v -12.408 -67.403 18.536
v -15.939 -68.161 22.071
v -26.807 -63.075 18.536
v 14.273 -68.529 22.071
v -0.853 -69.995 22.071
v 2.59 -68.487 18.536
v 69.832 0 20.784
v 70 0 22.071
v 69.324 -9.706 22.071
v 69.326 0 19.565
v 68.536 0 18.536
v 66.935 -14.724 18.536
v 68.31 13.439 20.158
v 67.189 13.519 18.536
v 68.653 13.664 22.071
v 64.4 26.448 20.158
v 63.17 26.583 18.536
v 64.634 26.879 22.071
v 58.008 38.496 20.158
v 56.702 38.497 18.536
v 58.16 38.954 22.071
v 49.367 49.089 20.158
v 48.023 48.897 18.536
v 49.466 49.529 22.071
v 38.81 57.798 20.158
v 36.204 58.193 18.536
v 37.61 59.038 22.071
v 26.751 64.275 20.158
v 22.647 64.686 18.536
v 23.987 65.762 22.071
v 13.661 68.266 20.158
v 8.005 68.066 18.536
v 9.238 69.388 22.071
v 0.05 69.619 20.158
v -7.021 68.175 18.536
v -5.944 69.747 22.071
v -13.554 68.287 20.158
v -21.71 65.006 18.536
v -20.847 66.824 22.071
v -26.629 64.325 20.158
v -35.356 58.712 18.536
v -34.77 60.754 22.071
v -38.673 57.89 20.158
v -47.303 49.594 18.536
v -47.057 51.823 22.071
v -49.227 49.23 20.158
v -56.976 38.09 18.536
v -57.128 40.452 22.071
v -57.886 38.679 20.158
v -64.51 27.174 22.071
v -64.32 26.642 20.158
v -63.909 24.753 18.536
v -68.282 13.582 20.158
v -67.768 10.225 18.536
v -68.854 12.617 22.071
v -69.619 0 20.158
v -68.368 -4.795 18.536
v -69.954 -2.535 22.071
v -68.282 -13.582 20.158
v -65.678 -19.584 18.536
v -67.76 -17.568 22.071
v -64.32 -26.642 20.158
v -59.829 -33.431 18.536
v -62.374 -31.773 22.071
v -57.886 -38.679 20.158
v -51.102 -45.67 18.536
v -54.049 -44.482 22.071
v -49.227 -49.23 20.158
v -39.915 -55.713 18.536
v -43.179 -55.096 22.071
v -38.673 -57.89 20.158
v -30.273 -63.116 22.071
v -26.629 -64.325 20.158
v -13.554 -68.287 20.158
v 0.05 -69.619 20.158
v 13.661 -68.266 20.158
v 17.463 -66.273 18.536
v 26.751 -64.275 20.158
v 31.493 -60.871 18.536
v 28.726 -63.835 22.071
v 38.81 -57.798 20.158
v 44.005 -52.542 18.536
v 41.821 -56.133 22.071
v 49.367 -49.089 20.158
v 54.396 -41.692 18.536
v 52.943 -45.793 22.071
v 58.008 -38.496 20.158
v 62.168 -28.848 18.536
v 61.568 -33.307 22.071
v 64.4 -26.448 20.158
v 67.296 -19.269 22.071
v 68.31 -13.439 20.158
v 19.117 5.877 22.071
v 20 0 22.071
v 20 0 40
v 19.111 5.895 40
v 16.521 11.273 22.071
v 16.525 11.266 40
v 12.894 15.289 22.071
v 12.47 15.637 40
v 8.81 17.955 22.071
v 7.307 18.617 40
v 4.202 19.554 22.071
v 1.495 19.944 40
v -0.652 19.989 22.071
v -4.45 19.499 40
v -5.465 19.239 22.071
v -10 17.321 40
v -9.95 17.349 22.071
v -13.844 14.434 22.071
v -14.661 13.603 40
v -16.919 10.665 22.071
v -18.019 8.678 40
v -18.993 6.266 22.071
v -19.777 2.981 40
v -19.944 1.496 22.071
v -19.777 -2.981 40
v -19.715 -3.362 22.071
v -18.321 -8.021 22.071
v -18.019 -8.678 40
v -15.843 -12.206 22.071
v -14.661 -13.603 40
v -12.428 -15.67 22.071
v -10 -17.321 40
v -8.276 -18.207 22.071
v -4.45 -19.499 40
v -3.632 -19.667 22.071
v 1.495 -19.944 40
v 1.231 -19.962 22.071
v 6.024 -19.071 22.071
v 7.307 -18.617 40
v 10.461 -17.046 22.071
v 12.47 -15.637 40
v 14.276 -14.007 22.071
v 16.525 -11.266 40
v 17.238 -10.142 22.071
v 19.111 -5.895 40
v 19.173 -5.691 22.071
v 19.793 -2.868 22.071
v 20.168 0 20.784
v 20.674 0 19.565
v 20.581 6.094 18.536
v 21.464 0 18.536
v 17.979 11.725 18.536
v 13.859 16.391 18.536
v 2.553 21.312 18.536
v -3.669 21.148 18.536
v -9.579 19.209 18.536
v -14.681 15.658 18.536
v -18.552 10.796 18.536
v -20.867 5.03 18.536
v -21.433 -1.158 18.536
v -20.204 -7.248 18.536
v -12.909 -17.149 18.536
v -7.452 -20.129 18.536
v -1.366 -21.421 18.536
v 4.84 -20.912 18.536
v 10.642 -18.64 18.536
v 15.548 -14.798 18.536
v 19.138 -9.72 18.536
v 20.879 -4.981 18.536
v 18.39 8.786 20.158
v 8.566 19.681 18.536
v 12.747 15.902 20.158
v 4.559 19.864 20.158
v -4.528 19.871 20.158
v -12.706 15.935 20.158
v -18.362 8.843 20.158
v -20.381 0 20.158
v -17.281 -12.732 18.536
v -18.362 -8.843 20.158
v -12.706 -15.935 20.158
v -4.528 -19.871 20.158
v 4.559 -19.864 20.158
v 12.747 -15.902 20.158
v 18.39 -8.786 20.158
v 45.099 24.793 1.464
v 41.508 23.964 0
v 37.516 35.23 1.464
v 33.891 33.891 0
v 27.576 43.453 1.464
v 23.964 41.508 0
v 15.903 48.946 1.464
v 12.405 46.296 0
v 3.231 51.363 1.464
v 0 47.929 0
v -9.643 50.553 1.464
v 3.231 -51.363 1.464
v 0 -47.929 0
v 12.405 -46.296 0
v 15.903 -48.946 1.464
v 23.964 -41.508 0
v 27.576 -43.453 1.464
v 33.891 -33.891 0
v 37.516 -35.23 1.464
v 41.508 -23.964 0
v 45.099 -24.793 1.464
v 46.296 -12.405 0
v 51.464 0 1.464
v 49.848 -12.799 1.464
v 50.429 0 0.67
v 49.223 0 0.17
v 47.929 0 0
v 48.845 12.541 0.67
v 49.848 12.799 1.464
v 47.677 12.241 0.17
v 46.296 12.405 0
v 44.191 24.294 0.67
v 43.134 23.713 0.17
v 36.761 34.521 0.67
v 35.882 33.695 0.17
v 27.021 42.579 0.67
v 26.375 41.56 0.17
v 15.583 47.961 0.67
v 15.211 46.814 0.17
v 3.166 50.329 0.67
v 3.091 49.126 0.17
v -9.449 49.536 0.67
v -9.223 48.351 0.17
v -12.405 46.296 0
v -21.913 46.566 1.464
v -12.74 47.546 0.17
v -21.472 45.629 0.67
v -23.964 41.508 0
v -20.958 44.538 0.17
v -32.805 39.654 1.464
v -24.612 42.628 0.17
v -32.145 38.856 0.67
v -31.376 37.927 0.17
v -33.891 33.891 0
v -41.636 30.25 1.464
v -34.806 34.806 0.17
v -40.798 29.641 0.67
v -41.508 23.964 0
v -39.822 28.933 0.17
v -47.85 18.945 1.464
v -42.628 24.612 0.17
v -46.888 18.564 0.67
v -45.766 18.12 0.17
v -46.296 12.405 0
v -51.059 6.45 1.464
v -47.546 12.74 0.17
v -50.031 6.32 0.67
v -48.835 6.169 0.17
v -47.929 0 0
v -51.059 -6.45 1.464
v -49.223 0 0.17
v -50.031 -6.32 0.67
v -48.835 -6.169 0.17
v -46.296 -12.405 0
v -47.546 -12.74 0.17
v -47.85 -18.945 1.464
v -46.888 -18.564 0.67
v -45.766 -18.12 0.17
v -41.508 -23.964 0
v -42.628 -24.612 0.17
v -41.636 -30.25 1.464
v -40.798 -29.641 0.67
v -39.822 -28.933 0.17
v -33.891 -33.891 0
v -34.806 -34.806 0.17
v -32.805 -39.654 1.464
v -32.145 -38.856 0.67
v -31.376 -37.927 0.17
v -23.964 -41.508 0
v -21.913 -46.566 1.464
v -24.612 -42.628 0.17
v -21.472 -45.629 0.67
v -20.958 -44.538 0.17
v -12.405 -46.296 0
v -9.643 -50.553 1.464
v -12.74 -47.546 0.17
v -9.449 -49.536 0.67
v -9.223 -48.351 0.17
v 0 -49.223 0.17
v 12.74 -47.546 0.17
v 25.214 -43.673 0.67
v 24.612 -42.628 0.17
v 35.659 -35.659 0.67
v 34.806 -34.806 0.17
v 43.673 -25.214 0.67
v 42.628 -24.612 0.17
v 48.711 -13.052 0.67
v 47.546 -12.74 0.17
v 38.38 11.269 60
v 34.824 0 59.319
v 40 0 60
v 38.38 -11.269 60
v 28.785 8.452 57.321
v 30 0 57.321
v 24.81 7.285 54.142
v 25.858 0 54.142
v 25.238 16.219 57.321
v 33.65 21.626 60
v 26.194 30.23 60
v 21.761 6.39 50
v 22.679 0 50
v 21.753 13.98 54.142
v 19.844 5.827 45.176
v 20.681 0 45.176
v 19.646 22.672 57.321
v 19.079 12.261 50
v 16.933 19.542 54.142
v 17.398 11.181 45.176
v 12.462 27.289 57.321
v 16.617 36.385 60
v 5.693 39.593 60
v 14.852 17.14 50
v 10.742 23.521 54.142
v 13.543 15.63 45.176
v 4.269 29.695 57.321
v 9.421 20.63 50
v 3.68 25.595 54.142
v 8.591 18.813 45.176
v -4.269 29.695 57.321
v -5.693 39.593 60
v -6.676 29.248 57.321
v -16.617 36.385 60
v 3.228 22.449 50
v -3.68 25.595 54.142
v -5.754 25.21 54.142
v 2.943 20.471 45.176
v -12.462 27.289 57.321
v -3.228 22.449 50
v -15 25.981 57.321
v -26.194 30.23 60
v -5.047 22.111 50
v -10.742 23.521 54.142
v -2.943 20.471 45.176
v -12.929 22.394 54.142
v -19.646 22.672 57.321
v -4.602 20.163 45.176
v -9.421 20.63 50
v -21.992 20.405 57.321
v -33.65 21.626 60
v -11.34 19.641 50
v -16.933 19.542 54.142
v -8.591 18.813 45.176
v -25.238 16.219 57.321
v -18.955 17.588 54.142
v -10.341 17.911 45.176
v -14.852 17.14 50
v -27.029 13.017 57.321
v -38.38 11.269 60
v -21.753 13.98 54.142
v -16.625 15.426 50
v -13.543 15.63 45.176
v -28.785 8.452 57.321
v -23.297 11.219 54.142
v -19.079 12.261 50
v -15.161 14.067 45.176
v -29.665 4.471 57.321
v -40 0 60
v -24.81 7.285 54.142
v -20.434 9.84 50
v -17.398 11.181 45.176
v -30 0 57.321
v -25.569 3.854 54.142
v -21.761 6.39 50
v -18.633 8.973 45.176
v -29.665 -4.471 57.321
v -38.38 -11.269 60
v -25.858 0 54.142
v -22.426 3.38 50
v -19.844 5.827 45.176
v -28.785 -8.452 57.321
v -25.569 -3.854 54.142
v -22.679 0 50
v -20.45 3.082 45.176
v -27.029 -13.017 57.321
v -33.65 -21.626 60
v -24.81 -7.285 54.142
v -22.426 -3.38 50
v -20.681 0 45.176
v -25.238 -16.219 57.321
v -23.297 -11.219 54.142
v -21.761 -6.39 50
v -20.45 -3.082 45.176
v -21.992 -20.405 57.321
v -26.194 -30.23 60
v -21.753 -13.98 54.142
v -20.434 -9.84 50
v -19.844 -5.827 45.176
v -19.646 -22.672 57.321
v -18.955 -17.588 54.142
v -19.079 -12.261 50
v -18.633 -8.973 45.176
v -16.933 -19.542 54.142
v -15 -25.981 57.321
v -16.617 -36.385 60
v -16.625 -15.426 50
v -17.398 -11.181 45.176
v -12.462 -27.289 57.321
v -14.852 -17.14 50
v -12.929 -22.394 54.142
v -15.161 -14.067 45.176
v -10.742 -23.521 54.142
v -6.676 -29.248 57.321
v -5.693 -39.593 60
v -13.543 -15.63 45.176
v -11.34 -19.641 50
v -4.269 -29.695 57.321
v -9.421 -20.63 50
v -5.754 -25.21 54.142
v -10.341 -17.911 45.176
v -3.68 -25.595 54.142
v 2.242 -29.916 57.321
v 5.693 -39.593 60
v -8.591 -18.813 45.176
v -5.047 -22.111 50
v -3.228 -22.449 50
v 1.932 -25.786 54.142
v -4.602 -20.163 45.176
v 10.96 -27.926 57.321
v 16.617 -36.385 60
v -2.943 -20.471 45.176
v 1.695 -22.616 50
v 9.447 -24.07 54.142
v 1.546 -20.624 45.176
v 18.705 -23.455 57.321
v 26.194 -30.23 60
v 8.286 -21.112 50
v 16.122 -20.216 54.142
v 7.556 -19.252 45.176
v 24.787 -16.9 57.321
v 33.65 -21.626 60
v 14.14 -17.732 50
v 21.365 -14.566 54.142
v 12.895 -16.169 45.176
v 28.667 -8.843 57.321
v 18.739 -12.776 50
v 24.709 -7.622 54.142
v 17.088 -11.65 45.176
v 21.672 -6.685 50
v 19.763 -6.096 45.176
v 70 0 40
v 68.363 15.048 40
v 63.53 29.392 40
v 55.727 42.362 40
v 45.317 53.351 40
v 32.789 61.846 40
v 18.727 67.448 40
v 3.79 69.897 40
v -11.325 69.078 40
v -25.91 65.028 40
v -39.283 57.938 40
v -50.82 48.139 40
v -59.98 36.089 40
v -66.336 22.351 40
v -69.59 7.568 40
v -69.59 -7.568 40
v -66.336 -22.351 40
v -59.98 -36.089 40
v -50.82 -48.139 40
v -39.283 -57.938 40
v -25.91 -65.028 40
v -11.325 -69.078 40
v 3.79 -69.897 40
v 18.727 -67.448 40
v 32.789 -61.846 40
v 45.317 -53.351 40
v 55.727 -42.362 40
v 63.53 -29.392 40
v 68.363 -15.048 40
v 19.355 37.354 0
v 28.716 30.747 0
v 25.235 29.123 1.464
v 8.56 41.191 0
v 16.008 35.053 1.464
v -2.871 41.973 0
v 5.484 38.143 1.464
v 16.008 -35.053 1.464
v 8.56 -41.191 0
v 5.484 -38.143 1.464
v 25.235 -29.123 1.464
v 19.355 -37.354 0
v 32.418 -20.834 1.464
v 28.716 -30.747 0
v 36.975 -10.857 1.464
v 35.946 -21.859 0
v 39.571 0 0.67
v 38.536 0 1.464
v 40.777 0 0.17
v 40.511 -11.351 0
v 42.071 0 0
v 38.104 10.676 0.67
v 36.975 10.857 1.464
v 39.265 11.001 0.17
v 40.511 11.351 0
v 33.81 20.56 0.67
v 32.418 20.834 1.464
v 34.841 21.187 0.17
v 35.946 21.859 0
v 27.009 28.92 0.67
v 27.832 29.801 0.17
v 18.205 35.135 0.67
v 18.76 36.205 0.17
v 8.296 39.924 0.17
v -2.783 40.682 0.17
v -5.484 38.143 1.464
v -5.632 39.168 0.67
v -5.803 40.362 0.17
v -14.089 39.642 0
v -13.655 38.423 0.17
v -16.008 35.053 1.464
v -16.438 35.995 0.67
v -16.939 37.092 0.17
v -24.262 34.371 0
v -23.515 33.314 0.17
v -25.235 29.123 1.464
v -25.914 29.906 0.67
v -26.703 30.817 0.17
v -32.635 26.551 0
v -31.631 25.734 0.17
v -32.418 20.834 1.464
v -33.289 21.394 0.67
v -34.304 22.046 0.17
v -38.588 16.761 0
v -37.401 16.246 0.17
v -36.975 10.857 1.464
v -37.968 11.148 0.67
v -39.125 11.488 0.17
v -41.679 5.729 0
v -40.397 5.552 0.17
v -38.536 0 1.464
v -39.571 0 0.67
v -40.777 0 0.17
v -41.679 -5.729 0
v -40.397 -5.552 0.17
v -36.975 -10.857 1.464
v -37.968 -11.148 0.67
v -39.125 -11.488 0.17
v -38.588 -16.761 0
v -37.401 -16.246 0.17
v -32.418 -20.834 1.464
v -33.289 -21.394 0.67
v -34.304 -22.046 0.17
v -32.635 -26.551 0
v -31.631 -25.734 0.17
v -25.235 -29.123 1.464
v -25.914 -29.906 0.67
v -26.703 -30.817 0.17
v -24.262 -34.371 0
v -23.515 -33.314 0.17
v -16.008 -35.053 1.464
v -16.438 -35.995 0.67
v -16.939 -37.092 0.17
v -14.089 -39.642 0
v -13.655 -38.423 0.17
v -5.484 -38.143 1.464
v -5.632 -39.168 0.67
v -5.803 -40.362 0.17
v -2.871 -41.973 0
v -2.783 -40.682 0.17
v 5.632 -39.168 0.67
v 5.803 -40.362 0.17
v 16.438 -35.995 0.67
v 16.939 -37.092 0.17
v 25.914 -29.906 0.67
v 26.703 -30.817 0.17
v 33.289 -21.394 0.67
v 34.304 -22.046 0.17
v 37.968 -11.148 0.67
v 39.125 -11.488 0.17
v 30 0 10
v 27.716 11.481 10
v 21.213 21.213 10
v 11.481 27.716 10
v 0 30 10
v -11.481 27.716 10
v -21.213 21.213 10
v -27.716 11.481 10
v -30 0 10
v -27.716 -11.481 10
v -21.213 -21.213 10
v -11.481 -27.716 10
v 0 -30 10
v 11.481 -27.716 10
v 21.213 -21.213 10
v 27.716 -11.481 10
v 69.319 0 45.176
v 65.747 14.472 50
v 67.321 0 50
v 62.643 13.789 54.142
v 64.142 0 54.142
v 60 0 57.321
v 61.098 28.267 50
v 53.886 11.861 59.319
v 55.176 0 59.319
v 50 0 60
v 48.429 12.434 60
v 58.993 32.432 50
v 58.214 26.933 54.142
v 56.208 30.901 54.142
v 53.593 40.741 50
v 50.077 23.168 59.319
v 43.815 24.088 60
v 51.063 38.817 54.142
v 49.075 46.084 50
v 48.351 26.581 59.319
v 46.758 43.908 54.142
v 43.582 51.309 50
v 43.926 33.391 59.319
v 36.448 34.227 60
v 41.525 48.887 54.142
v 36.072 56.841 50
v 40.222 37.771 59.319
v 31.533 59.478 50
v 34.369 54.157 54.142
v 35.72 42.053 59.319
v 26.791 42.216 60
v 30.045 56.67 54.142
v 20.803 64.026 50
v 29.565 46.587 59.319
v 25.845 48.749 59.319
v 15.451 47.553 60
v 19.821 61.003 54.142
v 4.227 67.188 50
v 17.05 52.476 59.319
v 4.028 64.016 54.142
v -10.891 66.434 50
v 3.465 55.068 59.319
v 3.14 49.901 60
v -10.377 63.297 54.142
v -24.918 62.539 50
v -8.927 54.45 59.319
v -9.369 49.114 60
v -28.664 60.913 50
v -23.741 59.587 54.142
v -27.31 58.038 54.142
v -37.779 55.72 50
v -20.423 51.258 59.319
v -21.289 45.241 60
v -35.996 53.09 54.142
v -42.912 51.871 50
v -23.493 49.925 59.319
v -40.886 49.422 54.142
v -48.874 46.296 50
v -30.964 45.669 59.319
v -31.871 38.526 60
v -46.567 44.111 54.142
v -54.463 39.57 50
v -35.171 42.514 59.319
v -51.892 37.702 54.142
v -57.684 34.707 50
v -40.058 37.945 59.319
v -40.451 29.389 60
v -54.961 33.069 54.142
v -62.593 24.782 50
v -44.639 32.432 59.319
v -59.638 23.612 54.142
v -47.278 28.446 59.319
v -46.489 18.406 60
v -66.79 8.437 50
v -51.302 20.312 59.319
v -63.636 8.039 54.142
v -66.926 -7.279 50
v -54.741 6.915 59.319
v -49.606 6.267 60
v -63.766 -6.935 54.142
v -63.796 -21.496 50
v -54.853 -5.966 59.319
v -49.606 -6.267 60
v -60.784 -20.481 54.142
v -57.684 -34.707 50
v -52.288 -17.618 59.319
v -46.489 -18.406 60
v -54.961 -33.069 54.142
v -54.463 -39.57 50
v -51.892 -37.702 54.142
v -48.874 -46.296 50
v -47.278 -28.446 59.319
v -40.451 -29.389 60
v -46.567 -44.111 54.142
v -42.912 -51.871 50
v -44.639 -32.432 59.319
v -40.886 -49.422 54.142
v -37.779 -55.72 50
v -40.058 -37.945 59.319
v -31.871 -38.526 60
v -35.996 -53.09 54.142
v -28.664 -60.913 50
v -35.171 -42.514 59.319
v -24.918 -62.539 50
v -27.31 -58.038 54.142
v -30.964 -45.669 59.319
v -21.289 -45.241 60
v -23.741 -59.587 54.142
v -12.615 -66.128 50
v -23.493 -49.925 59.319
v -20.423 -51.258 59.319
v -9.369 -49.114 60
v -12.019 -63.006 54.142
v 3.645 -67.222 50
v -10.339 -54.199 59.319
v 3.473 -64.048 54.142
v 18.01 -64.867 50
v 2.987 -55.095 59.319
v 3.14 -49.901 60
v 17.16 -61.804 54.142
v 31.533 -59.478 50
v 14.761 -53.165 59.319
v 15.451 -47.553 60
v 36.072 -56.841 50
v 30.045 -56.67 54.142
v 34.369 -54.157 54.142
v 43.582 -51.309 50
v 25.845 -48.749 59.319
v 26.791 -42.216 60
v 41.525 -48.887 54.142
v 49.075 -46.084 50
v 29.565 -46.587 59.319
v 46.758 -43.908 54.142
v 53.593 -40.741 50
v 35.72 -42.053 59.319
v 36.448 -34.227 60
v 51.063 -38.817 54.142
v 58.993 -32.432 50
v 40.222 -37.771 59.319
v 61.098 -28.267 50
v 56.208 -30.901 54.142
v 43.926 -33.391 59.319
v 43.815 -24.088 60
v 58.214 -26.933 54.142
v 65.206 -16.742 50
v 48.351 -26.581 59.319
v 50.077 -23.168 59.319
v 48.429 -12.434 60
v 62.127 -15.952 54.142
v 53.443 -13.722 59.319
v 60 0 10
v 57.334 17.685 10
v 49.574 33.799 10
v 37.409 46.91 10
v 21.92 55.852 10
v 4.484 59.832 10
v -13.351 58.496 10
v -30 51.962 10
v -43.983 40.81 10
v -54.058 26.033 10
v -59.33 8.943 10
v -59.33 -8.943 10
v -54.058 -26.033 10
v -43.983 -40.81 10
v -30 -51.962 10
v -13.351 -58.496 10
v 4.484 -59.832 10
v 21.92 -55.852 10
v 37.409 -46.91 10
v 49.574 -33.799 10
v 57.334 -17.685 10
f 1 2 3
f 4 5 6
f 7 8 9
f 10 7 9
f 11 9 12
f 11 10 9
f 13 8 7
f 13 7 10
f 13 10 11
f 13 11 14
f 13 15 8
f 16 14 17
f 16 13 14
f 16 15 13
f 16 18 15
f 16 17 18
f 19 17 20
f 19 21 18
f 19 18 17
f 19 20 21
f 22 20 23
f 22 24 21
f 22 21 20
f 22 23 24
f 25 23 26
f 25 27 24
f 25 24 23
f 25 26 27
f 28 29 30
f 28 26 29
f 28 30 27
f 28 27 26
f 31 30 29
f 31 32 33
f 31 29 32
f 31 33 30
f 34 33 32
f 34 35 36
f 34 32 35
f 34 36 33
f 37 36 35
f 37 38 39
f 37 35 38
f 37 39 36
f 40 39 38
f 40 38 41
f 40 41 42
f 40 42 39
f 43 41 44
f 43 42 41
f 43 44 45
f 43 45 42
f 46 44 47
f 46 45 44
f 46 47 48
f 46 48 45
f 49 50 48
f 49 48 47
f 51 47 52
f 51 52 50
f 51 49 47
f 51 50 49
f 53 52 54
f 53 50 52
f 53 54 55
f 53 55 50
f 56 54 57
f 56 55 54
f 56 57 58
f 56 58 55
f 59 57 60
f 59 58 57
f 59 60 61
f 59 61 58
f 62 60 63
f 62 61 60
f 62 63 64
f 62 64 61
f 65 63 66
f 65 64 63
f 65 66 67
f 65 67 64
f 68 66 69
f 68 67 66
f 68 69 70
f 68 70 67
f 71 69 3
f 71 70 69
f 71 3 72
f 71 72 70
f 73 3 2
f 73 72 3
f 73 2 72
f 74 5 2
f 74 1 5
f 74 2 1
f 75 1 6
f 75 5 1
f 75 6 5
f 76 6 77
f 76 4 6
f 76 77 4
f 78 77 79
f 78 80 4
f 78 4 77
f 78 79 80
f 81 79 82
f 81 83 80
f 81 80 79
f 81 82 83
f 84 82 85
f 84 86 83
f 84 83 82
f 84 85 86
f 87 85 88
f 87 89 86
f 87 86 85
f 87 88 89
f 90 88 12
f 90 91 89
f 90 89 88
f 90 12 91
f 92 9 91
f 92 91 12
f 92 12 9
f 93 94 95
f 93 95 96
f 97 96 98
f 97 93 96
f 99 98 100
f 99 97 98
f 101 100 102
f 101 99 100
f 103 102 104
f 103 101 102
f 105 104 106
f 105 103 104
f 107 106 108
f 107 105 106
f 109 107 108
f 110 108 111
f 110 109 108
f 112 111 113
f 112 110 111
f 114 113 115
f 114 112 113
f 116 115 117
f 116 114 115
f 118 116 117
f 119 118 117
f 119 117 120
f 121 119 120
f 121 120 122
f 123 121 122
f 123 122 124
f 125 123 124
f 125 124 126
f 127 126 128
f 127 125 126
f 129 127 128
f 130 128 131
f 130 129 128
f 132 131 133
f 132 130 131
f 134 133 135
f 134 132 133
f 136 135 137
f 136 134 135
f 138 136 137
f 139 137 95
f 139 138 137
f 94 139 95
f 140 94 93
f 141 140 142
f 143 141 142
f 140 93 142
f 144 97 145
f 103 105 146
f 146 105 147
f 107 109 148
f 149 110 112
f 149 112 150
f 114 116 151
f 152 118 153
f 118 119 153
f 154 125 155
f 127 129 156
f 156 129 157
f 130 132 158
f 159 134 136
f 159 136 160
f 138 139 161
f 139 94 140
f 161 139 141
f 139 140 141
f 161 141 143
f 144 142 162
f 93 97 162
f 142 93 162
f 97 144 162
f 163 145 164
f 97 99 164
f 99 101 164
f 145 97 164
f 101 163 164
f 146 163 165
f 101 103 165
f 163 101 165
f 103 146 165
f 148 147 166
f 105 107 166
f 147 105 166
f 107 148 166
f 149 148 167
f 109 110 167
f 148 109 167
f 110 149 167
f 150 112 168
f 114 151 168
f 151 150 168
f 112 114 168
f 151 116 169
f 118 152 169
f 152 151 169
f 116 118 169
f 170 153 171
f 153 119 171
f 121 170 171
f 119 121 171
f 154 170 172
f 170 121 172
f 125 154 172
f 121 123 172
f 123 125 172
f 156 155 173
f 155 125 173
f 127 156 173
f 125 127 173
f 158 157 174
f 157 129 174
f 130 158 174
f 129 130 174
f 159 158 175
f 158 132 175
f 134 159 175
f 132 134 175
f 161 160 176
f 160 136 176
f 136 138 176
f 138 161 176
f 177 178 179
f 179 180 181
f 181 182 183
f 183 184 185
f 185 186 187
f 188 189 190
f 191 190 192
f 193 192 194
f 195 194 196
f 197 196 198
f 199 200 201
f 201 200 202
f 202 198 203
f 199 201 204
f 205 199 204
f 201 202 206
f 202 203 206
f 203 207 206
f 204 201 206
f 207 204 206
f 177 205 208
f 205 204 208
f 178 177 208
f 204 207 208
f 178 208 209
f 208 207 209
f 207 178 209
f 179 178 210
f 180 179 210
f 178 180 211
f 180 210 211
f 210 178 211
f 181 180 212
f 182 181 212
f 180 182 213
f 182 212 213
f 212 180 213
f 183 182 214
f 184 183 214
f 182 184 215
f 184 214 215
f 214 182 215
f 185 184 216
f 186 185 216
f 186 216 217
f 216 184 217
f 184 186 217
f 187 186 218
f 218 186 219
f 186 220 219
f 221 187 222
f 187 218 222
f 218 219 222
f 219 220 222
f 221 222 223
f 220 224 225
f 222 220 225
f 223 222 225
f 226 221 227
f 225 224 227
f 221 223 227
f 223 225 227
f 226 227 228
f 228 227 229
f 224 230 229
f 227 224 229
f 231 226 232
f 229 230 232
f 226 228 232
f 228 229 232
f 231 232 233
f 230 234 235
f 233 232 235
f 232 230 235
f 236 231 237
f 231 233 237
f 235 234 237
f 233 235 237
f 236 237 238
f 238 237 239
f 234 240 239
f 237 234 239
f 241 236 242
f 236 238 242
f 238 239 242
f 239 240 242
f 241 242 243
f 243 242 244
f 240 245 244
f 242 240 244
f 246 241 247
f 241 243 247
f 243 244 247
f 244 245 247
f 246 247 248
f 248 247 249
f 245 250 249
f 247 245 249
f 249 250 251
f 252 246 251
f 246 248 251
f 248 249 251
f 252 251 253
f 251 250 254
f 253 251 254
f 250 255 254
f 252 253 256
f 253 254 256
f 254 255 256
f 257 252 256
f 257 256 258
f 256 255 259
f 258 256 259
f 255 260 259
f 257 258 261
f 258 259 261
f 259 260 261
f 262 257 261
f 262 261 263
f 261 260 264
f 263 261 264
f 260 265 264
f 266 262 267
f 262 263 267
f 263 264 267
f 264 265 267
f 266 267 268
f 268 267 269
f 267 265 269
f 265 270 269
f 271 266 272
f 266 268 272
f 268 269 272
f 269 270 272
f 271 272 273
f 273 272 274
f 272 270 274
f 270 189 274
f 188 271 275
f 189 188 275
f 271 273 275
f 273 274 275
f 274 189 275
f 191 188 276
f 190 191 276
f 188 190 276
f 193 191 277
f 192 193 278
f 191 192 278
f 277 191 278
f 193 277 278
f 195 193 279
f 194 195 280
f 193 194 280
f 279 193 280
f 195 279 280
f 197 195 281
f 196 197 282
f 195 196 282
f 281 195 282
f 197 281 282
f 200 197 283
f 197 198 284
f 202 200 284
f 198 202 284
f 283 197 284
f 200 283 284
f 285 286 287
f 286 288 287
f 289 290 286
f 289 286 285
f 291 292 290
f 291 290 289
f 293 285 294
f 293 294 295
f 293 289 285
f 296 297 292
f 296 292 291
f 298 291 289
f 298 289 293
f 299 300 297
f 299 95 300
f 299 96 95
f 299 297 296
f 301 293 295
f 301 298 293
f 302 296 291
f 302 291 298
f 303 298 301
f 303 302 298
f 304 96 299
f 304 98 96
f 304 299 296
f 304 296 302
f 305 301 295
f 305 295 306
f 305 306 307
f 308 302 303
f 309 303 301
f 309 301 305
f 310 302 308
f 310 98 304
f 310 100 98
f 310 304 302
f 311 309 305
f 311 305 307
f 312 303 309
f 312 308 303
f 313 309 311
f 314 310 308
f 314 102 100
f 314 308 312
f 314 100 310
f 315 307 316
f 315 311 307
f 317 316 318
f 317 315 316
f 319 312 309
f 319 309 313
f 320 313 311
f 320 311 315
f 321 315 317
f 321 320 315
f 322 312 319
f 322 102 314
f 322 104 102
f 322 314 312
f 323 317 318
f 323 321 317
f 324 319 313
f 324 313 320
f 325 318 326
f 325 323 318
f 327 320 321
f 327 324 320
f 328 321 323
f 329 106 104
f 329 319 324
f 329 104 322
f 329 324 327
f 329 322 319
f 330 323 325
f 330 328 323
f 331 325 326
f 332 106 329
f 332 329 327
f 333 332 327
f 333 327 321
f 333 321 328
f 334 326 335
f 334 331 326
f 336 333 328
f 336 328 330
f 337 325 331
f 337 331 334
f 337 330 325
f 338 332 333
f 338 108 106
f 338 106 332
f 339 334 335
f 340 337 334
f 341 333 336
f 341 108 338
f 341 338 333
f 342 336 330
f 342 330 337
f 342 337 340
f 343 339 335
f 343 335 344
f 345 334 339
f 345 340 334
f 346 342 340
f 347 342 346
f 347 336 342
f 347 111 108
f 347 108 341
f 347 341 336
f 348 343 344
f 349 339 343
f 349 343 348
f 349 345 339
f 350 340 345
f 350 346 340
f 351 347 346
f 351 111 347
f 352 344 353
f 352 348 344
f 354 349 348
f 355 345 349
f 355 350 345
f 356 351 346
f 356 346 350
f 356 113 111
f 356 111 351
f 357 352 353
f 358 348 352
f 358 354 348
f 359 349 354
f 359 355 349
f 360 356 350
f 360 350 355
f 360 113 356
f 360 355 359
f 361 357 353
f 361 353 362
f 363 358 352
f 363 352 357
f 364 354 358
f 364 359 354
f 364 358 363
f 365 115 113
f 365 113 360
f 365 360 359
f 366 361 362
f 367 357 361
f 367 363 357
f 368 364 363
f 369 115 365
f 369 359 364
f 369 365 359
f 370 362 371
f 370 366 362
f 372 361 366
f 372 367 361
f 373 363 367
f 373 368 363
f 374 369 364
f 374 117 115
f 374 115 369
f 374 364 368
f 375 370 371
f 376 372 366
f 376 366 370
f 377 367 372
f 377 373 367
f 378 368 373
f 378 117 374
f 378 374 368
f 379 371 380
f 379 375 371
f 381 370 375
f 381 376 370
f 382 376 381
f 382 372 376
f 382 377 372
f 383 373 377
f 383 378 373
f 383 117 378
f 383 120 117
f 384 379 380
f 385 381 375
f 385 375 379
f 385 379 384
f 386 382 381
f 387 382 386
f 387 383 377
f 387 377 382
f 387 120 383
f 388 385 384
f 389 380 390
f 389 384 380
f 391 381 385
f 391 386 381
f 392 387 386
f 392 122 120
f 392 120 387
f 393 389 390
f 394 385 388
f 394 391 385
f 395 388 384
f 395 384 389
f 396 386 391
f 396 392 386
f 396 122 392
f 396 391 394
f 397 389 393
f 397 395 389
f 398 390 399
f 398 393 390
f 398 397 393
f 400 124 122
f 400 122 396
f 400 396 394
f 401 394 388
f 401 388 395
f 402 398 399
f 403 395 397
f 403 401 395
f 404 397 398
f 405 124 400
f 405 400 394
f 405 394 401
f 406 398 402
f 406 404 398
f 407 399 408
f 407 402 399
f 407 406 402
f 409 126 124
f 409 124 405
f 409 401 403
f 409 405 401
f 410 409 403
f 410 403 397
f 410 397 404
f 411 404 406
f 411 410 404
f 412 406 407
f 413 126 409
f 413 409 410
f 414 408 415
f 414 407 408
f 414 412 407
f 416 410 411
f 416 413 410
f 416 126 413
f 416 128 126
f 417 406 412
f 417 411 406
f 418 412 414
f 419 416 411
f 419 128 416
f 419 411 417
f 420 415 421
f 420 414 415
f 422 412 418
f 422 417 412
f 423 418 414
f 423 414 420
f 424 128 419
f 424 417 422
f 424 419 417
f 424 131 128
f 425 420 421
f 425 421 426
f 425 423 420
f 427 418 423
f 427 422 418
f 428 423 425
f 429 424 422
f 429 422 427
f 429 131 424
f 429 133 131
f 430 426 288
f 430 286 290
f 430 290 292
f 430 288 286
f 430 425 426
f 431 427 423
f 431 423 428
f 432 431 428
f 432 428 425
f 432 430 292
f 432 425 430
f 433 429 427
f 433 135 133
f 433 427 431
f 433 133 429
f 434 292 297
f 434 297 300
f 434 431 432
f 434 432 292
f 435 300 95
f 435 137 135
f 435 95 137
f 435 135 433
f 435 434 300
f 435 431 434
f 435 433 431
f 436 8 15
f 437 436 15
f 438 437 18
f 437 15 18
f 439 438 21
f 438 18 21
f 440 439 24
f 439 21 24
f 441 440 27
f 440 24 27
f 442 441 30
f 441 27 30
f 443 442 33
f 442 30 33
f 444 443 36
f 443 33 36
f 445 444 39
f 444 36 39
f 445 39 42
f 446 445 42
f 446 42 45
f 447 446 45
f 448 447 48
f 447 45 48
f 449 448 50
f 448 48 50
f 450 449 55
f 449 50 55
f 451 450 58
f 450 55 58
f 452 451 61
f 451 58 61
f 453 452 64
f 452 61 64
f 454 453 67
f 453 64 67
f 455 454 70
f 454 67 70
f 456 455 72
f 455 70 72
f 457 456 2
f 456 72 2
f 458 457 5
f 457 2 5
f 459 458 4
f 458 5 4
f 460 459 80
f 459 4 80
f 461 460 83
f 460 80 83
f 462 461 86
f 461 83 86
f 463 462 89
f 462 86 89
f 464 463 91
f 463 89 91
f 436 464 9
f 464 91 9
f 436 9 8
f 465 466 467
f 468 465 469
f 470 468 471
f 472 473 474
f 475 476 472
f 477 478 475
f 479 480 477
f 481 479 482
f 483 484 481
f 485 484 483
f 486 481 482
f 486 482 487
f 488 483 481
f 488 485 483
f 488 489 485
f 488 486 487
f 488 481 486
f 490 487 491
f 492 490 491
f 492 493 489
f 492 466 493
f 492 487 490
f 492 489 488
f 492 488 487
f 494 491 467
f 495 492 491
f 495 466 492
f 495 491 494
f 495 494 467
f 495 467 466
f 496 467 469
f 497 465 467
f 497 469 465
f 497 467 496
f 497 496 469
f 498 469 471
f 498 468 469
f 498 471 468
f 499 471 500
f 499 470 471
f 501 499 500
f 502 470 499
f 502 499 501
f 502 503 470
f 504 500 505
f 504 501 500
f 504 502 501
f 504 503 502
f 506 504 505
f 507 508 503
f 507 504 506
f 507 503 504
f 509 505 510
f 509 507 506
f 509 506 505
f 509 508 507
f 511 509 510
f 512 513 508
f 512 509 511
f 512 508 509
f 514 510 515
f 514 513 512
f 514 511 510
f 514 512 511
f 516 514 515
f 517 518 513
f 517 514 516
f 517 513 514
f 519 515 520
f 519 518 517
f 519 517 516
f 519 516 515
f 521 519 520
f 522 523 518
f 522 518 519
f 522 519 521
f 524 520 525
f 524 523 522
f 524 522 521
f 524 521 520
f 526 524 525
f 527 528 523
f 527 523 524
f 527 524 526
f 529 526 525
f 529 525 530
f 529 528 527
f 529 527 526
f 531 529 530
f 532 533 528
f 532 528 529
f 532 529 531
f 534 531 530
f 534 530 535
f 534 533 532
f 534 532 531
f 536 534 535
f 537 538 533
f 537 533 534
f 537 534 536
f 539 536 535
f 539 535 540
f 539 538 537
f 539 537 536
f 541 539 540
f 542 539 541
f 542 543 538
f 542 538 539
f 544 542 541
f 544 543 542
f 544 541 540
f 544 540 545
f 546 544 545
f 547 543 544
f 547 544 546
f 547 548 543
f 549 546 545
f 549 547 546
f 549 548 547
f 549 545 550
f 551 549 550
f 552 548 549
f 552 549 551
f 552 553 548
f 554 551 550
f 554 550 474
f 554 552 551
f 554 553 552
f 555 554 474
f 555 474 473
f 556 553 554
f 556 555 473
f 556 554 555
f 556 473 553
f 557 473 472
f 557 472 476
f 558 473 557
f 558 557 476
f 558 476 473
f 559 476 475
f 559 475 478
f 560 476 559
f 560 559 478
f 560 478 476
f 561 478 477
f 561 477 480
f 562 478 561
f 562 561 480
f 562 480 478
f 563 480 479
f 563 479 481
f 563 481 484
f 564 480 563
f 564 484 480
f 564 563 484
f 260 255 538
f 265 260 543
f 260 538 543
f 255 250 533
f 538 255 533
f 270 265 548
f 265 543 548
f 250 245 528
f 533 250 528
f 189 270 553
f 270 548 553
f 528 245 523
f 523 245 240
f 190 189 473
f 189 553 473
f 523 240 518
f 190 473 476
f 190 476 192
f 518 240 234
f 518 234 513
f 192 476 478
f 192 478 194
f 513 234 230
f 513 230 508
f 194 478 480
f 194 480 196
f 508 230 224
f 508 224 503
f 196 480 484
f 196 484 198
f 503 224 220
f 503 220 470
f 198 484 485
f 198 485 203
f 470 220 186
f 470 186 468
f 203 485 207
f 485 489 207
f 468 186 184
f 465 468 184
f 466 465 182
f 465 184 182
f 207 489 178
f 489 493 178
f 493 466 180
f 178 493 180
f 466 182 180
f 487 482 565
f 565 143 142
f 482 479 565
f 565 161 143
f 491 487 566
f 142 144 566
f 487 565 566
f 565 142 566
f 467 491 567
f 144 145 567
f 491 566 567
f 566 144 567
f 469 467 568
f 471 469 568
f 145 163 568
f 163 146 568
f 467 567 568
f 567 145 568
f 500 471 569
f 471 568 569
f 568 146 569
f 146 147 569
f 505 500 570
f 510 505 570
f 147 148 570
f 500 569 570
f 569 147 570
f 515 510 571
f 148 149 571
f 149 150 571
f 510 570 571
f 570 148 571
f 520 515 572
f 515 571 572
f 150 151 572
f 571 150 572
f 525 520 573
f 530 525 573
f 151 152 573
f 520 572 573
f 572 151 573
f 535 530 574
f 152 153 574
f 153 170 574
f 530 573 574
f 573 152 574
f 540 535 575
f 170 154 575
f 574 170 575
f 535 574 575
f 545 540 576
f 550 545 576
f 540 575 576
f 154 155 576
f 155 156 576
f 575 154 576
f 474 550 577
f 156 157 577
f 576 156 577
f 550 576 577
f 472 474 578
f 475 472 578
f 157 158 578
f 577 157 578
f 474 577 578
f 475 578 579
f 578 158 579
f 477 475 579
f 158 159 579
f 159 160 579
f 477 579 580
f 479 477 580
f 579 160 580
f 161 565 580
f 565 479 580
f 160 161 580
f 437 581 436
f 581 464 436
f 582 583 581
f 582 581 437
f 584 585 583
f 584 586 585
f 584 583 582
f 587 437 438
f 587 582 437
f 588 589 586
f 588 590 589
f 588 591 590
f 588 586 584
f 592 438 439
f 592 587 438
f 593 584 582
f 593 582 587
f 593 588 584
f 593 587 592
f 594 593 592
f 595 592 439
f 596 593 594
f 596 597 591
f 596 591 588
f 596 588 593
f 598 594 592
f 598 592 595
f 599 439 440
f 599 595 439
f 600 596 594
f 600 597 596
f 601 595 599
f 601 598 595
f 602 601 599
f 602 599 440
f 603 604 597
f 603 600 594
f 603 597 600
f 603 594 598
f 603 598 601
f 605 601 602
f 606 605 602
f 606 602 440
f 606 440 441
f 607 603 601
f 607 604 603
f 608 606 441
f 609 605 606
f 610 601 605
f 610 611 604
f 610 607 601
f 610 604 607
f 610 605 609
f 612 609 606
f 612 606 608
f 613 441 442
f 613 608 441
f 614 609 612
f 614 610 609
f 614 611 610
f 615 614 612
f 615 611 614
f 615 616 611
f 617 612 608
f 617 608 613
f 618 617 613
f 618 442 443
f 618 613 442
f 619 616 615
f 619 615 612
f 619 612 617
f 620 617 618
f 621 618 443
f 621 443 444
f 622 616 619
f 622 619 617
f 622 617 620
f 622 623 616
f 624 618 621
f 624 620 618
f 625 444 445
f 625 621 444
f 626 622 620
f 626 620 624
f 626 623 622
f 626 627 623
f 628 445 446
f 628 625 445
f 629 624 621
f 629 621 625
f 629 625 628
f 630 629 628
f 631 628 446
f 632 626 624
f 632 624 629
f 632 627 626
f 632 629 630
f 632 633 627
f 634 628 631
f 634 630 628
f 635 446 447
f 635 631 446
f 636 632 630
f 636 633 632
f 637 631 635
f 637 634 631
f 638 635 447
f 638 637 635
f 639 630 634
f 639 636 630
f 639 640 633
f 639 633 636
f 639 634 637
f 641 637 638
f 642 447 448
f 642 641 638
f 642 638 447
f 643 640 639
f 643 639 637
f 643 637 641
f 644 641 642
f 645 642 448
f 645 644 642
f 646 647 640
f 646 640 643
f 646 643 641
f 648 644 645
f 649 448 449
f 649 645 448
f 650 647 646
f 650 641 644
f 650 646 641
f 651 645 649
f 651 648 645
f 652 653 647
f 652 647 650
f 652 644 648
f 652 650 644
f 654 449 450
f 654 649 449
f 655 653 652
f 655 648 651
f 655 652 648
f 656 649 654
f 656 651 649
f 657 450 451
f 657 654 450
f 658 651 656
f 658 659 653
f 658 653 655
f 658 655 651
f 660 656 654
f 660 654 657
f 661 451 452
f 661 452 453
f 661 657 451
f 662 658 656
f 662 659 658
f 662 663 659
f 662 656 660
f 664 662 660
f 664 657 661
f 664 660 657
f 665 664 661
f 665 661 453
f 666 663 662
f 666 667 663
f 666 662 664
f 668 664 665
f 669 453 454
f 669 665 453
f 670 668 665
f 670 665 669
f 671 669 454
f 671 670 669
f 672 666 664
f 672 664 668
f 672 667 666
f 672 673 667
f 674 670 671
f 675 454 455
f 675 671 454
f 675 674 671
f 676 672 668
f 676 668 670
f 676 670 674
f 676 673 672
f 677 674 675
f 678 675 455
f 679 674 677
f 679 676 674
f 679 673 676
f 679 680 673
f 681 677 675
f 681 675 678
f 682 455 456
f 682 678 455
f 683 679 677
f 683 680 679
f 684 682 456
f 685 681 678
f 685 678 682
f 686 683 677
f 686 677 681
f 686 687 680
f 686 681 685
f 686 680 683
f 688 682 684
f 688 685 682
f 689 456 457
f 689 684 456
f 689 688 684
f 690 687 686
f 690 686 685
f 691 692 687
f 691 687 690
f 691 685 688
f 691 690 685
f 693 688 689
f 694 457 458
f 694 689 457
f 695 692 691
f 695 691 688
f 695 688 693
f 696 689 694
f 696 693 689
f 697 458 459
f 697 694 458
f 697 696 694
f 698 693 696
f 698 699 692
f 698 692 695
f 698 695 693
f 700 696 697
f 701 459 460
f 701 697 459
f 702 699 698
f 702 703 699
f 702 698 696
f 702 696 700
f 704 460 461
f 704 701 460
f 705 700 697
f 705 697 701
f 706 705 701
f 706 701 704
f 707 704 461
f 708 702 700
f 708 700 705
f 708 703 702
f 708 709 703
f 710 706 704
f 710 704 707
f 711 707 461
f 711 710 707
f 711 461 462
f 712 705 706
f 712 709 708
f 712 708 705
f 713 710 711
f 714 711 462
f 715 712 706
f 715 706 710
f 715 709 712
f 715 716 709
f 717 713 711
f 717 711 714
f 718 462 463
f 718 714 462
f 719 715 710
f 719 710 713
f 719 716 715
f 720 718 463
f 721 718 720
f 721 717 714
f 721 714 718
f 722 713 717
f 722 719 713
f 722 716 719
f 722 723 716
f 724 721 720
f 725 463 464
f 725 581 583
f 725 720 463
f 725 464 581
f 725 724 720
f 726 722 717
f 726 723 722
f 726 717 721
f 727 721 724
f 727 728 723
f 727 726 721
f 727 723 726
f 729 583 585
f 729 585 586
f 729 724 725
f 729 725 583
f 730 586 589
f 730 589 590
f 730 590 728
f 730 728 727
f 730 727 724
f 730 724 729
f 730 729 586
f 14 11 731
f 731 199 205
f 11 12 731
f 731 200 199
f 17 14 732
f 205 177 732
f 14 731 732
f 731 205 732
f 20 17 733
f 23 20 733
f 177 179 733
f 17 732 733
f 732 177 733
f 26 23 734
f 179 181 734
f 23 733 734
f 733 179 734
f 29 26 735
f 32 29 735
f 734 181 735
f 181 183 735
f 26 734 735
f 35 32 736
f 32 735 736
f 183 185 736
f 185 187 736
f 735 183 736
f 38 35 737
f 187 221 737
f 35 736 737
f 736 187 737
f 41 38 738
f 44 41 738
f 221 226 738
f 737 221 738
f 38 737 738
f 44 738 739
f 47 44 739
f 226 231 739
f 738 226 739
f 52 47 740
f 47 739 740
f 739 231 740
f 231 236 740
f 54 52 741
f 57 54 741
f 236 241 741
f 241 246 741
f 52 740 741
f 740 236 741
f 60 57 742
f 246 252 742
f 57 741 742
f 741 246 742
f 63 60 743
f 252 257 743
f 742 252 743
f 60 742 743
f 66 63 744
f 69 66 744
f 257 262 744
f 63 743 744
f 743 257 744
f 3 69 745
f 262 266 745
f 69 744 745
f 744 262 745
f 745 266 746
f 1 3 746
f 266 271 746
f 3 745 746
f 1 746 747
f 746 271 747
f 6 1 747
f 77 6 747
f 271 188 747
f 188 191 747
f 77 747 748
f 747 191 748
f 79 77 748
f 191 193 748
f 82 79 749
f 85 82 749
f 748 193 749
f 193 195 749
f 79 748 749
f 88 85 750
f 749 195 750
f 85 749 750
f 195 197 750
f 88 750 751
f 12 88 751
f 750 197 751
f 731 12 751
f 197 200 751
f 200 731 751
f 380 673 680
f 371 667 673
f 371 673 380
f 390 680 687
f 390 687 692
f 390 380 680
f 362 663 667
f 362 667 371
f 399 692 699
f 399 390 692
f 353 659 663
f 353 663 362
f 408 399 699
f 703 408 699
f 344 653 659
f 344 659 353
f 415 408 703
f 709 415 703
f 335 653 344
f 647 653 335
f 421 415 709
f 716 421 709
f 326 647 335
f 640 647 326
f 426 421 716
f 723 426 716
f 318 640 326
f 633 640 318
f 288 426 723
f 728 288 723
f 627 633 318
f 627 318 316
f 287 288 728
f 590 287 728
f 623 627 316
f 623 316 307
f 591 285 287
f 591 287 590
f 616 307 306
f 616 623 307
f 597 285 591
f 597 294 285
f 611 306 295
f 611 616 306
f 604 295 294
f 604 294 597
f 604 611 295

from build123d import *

# Parameters (mm, degrees)
F0_R     = 70
F0_R_2   = 20
F1_DEPTH = 60
F2_R     = 20
F3_SIZE  = 20
F4_R     = 20
F5_R     = 5


with BuildPart() as f1:
    # F0 (on Top) → F1 (new body)
    with BuildSketch(Plane.XY):
        Circle(F0_R)
        Circle(F0_R_2, mode=Mode.SUBTRACT)
    extrude(amount=F1_DEPTH)

    # F2
    f2_edges = [f1.edges().sort_by_distance(p)[0] for p in [
        (-70, 0, 60),
    ]]
    fillet(f2_edges, radius=F2_R)

    # F3
    f3_edges = [f1.edges().sort_by_distance(p)[0] for p in [
        (-70, 0, 0),
        (-20, 0, 0),
    ]]
    chamfer(f3_edges, length=F3_SIZE)

    # F4
    f4_edges = [f1.edges().sort_by_distance(p)[0] for p in [
        (-20, 0, 60),
    ]]
    fillet(f4_edges, radius=F4_R)

    # F5
    f5_edges = [f1.edges().sort_by_distance(p)[0] for p in [
        (-70, 0, 20),
        (-50, 0, 0),
        (-40, 0, 0),
        (-20, 0, 20),
    ]]
    fillet(f5_edges, radius=F5_R)


solid = f1.part
